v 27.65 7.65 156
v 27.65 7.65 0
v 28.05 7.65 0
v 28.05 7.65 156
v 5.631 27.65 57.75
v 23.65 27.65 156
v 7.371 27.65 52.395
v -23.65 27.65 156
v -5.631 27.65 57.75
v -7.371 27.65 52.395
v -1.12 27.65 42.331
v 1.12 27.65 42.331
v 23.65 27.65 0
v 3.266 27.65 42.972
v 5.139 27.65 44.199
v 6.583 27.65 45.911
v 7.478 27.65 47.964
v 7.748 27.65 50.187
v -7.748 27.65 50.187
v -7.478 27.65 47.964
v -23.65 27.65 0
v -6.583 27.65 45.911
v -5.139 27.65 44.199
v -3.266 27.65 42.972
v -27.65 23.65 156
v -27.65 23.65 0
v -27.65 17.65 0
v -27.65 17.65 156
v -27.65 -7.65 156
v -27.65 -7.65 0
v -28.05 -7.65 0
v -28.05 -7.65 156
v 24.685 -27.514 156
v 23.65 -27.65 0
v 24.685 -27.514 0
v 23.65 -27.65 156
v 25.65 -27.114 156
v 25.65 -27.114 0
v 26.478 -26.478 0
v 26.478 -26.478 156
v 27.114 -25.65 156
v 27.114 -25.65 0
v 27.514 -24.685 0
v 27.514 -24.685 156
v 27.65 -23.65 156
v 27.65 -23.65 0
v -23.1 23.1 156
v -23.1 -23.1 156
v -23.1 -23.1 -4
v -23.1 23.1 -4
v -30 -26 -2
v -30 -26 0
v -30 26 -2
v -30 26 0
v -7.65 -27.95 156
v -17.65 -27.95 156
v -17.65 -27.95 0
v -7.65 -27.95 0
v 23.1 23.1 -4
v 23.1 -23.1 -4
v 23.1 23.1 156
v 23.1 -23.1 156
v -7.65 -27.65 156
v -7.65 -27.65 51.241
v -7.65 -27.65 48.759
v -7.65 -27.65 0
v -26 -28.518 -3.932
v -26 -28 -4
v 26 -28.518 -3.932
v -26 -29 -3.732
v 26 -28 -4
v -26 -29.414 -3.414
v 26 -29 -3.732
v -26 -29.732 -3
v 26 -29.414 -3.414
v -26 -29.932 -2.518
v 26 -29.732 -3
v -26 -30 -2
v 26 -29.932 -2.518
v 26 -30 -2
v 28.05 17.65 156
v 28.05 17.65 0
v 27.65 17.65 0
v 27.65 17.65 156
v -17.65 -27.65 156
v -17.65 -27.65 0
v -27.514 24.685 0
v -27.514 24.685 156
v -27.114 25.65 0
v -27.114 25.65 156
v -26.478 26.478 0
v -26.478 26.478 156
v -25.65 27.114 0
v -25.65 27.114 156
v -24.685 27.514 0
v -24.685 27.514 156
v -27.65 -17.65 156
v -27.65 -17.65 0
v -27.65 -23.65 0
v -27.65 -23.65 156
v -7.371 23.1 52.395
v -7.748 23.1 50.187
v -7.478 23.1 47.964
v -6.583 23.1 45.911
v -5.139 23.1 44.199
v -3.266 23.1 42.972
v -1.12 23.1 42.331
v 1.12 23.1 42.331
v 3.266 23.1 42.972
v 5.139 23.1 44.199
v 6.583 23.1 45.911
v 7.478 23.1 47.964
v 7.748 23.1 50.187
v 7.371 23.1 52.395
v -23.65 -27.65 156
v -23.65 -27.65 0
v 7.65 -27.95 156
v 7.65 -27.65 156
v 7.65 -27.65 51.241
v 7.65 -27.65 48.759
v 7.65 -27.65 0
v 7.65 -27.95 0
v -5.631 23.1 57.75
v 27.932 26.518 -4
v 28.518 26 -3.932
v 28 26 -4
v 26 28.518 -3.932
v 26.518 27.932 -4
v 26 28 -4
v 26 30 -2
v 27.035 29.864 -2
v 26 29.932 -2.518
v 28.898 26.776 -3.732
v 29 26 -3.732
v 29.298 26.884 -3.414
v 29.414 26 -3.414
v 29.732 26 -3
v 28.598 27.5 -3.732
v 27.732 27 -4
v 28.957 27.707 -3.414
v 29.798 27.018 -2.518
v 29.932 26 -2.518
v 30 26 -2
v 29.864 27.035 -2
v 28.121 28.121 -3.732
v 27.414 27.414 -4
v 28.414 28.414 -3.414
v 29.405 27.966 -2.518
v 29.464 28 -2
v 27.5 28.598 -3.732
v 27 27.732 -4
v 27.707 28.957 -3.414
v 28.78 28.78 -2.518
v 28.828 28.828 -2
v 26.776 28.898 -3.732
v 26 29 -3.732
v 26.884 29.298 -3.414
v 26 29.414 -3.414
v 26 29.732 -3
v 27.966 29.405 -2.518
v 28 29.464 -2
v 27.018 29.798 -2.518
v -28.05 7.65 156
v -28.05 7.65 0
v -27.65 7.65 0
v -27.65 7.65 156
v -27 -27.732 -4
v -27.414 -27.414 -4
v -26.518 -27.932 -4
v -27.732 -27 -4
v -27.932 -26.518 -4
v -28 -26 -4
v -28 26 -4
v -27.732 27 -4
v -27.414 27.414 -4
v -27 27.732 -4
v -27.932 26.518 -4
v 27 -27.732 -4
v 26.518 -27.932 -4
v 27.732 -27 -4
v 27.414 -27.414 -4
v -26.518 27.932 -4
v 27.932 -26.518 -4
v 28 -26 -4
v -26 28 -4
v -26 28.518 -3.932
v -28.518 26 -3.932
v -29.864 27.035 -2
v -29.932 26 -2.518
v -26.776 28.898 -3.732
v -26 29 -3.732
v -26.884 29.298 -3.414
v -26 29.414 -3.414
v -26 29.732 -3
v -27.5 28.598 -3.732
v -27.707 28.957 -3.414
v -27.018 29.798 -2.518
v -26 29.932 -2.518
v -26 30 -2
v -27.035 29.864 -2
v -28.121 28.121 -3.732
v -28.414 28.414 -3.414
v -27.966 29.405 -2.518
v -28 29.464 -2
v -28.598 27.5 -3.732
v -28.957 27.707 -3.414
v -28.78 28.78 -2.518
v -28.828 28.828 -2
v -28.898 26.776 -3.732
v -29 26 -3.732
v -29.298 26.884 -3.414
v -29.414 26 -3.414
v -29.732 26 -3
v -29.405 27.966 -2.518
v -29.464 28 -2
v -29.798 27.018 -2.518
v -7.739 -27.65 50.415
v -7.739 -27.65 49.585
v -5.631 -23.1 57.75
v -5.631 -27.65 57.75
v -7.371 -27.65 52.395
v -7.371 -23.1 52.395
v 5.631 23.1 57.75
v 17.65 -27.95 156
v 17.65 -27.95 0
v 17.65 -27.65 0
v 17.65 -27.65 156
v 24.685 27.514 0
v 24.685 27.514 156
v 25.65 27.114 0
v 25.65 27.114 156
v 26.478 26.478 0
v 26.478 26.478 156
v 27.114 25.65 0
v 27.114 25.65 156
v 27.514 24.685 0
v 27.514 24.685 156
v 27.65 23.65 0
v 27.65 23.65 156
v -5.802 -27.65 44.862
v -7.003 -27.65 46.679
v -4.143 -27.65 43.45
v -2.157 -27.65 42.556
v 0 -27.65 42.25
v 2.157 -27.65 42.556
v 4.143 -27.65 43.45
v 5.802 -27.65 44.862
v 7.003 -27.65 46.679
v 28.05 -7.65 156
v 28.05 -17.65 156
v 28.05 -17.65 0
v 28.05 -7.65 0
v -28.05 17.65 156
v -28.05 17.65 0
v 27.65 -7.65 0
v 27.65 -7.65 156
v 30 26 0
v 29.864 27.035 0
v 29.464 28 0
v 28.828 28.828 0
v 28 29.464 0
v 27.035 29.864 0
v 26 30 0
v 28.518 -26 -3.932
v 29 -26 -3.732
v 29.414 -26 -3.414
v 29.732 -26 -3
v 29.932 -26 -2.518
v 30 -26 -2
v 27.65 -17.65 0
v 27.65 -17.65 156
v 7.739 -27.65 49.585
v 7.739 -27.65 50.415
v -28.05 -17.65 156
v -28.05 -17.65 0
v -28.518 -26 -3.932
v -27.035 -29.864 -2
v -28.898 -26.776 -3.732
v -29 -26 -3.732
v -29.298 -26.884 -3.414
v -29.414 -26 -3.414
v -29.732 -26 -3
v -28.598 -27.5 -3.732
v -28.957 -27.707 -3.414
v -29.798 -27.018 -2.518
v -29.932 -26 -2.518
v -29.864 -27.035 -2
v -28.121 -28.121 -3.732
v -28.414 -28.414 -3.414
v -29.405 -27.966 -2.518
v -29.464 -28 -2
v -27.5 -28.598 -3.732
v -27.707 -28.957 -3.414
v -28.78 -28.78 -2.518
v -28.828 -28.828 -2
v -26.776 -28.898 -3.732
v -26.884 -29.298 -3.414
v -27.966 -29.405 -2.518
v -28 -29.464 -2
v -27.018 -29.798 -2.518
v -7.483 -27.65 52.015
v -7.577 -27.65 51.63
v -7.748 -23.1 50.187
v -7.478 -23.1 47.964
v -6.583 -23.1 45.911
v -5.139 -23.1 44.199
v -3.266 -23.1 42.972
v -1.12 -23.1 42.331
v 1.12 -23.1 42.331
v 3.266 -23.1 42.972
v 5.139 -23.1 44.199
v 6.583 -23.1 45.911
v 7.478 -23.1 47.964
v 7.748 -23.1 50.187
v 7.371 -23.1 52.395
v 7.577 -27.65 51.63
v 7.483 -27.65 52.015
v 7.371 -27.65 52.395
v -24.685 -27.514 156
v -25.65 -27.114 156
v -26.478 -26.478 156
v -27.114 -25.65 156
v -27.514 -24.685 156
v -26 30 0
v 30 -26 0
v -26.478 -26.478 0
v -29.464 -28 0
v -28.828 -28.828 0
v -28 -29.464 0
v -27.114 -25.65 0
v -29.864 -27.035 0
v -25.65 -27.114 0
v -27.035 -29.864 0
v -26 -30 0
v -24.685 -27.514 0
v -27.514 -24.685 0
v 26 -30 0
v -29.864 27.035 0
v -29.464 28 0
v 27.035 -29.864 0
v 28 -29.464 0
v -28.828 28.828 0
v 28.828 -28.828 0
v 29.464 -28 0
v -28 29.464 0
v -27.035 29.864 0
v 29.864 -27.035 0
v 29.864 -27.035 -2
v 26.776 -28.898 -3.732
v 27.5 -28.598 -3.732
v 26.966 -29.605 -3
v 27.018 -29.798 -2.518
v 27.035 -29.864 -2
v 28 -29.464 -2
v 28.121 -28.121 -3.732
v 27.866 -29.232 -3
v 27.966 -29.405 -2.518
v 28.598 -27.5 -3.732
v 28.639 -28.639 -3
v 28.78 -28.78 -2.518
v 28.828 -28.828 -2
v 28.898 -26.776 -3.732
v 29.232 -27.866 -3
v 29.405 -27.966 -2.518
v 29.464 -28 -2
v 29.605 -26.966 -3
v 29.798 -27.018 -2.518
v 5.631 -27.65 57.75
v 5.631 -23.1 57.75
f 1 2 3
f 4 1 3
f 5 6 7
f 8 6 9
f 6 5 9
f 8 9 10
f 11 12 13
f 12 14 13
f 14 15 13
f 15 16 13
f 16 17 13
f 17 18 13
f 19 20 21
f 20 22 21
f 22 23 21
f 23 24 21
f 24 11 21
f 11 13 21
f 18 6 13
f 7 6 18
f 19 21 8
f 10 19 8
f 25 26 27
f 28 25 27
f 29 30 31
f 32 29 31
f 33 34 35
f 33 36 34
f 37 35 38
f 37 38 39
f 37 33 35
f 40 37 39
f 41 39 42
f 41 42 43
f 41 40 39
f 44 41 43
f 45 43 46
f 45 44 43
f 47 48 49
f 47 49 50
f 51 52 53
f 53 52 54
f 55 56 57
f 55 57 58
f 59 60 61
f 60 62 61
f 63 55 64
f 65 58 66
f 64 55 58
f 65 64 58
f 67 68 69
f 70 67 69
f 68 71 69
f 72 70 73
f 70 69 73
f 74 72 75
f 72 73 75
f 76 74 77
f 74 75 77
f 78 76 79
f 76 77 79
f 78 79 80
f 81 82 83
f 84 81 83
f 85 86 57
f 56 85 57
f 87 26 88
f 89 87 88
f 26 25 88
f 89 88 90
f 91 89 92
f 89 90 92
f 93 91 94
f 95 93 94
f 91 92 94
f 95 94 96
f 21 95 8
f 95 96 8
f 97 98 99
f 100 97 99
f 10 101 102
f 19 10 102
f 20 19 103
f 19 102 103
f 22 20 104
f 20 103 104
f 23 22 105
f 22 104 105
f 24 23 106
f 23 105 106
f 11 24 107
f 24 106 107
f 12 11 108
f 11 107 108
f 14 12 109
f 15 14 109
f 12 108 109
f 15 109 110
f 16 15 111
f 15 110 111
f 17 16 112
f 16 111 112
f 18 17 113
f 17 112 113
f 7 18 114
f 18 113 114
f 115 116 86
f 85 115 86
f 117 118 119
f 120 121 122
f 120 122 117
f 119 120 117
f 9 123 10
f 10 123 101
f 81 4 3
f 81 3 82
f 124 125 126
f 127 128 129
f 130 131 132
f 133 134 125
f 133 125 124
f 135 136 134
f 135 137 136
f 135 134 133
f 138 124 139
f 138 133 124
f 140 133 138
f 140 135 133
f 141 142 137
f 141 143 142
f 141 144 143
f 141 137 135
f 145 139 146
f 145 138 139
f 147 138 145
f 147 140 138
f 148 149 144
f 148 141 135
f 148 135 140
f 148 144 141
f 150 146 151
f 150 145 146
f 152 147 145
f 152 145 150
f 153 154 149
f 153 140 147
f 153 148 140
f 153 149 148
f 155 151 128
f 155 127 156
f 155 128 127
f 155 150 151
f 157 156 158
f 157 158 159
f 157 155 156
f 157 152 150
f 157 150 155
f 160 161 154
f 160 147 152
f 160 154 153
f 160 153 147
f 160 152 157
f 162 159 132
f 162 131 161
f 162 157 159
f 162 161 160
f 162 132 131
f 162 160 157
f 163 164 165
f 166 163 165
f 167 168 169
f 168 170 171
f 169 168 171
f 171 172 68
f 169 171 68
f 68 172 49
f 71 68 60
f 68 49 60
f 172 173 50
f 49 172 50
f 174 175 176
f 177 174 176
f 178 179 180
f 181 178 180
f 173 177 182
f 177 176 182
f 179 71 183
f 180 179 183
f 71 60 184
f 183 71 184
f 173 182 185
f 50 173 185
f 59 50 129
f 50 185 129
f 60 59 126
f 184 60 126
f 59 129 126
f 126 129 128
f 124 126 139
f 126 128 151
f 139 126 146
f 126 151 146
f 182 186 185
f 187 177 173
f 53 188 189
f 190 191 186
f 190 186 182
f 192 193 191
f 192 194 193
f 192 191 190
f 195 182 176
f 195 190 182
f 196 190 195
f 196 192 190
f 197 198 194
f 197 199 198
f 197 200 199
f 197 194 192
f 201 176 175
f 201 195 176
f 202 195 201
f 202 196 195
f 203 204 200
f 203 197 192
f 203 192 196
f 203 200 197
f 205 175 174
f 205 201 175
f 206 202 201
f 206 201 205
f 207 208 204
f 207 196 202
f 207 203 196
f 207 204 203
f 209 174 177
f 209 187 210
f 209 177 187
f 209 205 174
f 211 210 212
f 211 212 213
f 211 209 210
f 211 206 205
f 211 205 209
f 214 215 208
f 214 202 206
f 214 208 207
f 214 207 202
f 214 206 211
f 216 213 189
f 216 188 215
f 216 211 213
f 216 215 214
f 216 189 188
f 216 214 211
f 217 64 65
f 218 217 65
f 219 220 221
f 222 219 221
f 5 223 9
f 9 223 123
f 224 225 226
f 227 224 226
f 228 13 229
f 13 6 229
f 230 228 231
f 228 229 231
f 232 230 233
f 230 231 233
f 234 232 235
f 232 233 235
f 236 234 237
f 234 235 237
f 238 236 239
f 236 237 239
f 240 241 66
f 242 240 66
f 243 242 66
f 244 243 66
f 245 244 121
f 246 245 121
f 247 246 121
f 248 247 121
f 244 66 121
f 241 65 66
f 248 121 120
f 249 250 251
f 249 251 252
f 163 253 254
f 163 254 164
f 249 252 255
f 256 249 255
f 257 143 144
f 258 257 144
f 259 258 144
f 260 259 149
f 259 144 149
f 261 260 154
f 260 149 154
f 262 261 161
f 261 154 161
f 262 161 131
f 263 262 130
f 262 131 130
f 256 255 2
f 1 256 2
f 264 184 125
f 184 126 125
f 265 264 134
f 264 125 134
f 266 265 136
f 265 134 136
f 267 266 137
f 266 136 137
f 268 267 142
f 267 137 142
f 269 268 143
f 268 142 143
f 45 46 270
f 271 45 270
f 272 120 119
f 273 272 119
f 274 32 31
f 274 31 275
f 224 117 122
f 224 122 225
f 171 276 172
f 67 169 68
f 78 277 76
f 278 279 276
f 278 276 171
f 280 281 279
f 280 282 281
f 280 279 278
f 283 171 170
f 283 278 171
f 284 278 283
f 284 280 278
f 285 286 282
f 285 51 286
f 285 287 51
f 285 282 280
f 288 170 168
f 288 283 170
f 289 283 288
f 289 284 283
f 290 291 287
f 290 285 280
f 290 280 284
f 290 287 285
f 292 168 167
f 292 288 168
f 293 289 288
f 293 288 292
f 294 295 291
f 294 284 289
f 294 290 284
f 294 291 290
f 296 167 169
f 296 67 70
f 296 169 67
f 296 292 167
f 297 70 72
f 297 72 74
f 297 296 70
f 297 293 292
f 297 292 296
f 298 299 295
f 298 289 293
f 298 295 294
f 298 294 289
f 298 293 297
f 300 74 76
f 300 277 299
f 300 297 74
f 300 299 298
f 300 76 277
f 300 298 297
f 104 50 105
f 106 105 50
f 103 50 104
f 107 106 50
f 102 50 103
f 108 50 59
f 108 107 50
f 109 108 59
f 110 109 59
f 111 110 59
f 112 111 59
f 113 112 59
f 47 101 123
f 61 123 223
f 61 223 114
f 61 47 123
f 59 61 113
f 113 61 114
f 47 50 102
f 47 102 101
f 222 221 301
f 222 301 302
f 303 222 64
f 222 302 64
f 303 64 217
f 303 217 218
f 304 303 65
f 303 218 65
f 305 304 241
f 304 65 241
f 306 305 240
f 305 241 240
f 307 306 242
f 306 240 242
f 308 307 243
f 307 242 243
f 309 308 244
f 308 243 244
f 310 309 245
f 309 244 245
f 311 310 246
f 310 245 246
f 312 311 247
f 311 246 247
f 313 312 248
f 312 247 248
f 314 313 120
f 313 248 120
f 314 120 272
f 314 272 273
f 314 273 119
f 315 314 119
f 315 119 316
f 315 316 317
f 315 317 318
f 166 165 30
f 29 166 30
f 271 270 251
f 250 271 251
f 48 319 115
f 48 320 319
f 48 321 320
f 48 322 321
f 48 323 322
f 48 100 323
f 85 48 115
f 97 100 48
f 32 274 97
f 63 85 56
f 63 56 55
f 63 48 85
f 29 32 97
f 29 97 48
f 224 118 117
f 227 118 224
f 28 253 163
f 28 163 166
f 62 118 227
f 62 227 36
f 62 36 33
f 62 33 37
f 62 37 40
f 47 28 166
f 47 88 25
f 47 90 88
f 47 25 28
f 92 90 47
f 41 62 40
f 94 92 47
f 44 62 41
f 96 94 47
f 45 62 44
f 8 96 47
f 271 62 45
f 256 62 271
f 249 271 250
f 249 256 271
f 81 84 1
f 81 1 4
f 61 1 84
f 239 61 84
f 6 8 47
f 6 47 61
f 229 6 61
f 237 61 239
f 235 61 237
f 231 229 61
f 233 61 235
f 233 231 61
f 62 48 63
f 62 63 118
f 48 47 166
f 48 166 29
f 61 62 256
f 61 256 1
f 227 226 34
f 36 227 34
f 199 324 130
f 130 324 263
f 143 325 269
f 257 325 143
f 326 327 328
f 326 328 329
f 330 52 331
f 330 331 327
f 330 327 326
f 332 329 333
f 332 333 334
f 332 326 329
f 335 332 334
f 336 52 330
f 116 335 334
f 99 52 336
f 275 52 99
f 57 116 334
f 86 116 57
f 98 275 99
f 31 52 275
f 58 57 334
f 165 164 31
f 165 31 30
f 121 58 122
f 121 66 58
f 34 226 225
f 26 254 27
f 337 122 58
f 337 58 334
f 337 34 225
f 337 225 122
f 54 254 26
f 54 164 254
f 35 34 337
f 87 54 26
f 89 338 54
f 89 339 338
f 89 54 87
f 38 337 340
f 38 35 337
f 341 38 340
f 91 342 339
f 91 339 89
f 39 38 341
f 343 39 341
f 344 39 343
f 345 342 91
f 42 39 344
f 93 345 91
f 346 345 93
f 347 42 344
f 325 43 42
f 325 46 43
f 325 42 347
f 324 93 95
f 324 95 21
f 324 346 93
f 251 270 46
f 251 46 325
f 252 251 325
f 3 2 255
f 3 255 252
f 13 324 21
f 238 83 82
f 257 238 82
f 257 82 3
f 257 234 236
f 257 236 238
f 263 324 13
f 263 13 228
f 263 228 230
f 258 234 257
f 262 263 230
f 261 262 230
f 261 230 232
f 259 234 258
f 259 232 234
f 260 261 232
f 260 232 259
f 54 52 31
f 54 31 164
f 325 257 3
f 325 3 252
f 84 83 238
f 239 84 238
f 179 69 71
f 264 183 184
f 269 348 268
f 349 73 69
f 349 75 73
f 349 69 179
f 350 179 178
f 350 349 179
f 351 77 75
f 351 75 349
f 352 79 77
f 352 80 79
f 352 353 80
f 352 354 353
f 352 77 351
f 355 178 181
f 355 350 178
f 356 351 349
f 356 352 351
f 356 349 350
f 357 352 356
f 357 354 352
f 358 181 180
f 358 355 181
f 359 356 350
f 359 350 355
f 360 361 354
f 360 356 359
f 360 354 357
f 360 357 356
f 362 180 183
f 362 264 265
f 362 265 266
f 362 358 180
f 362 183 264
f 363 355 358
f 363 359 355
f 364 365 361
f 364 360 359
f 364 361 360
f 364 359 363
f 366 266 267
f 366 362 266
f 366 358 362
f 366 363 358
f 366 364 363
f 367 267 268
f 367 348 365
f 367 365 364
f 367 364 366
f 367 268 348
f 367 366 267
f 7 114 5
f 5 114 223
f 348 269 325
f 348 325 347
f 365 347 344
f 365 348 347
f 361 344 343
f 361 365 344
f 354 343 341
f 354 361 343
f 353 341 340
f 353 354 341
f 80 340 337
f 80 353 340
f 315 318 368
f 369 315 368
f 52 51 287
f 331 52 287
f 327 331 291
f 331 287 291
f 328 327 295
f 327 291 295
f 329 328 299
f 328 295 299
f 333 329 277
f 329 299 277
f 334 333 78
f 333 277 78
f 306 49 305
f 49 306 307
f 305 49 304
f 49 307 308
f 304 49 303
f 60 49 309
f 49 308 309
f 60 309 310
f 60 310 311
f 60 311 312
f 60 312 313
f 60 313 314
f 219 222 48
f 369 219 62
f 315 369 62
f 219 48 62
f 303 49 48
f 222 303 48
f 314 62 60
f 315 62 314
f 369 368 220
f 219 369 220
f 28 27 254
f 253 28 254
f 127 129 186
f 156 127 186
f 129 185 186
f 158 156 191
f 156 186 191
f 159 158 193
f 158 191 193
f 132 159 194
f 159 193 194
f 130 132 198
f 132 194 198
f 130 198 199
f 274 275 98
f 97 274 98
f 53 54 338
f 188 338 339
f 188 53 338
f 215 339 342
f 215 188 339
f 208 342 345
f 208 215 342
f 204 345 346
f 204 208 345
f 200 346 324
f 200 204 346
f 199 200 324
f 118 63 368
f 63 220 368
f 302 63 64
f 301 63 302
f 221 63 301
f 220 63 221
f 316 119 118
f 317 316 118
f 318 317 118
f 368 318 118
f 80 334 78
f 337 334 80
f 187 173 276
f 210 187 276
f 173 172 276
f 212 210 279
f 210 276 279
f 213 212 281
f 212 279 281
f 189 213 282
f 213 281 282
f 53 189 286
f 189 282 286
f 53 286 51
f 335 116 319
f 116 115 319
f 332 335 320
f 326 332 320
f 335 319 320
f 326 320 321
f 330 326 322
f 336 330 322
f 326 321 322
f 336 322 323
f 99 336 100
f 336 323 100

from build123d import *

# Parameters (mm, degrees)
F0_W     = 46.2
F0_H     = 46.2
F1_DEPTH = 156
F0_W_2   = 60
F0_H_2   = 60
F2_DEPTH = 4
F3_R     = 4
F4_R     = 2
F7_DEPTH = 80


with BuildPart() as f1:
    # F0 (on Top) → F1 (new body)
    with BuildSketch(Plane.XY):
        Polygon((27.65, 17.65), (27.65, 27.65), (-27.65, 27.65), (-27.65, 17.65), (-28.05, 17.65), (-28.05, 7.65), (-27.65, 7.65), (-27.65, -7.65), (-28.05, -7.65), (-28.05, -17.65), (-27.65, -17.65), (-27.65, -27.65), (-17.65, -27.65), (-17.65, -27.95), (-7.65, -27.95), (-7.65, -27.65), (7.65, -27.65), (7.65, -27.95), (17.65, -27.95), (17.65, -27.65), (27.65, -27.65), (27.65, -17.65), (28.05, -17.65), (28.05, -7.65), (27.65, -7.65), (27.65, 7.65), (28.05, 7.65), (28.05, 17.65), align=None)
        Rectangle(F0_W, F0_H, mode=Mode.SUBTRACT)
    extrude(amount=F1_DEPTH)

    # F0 (on Top) → F2 (join)
    with BuildSketch(Plane.XY):
        Rectangle(F0_W_2, F0_H_2)
        Polygon((-27.65, 27.65), (27.65, 27.65), (27.65, 17.65), (28.05, 17.65), (28.05, 7.65), (27.65, 7.65), (27.65, -7.65), (28.05, -7.65), (28.05, -17.65), (27.65, -17.65), (27.65, -27.65), (17.65, -27.65), (17.65, -27.95), (7.65, -27.95), (7.65, -27.65), (-7.65, -27.65), (-7.65, -27.95), (-17.65, -27.95), (-17.65, -27.65), (-27.65, -27.65), (-27.65, -17.65), (-28.05, -17.65), (-28.05, -7.65), (-27.65, -7.65), (-27.65, 7.65), (-28.05, 7.65), (-28.05, 17.65), (-27.65, 17.65), align=None, mode=Mode.SUBTRACT)
        Polygon((27.65, 17.65), (27.65, 27.65), (-27.65, 27.65), (-27.65, 17.65), (-28.05, 17.65), (-28.05, 7.65), (-27.65, 7.65), (-27.65, -7.65), (-28.05, -7.65), (-28.05, -17.65), (-27.65, -17.65), (-27.65, -27.65), (-17.65, -27.65), (-17.65, -27.95), (-7.65, -27.95), (-7.65, -27.65), (7.65, -27.65), (7.65, -27.95), (17.65, -27.95), (17.65, -27.65), (27.65, -27.65), (27.65, -17.65), (28.05, -17.65), (28.05, -7.65), (27.65, -7.65), (27.65, 7.65), (28.05, 7.65), (28.05, 17.65), align=None)
        Rectangle(F0_W, F0_H, mode=Mode.SUBTRACT)
    extrude(amount=-F2_DEPTH)

    # F3
    f3_edges = [f1.edges().sort_by_distance(p)[0] for p in [
        (-27.65, 27.65, 78),
        (-27.65, -27.65, 78),
        (27.65, -27.65, 78),
        (27.65, 27.65, 78),
        (30, 30, -2),
        (30, -30, -2),
        (-30, 30, -2),
        (-30, -30, -2),
    ]]
    fillet(f3_edges, radius=F3_R)

    # F4
    f4_edges = [f1.edges().sort_by_distance(p)[0] for p in [
        (30, 0, -4),
    ]]
    fillet(f4_edges, radius=F4_R)

    # F6 (on offset) → F7 (cut)
    with BuildSketch(Plane.XZ.offset(27.65)):
        with BuildLine():
            Line((-5.630705, 57.75), (-7.370688, 52.394882))
            ThreePointArc((-7.370688, 52.394882), (0, 42.25), (7.370688, 52.394882))
            Line((7.370688, 52.394882), (5.630705, 57.75))
            Line((5.630705, 57.75), (-5.630705, 57.75))
        make_face()
    extrude(amount=-F7_DEPTH, mode=Mode.SUBTRACT)


solid = f1.part
